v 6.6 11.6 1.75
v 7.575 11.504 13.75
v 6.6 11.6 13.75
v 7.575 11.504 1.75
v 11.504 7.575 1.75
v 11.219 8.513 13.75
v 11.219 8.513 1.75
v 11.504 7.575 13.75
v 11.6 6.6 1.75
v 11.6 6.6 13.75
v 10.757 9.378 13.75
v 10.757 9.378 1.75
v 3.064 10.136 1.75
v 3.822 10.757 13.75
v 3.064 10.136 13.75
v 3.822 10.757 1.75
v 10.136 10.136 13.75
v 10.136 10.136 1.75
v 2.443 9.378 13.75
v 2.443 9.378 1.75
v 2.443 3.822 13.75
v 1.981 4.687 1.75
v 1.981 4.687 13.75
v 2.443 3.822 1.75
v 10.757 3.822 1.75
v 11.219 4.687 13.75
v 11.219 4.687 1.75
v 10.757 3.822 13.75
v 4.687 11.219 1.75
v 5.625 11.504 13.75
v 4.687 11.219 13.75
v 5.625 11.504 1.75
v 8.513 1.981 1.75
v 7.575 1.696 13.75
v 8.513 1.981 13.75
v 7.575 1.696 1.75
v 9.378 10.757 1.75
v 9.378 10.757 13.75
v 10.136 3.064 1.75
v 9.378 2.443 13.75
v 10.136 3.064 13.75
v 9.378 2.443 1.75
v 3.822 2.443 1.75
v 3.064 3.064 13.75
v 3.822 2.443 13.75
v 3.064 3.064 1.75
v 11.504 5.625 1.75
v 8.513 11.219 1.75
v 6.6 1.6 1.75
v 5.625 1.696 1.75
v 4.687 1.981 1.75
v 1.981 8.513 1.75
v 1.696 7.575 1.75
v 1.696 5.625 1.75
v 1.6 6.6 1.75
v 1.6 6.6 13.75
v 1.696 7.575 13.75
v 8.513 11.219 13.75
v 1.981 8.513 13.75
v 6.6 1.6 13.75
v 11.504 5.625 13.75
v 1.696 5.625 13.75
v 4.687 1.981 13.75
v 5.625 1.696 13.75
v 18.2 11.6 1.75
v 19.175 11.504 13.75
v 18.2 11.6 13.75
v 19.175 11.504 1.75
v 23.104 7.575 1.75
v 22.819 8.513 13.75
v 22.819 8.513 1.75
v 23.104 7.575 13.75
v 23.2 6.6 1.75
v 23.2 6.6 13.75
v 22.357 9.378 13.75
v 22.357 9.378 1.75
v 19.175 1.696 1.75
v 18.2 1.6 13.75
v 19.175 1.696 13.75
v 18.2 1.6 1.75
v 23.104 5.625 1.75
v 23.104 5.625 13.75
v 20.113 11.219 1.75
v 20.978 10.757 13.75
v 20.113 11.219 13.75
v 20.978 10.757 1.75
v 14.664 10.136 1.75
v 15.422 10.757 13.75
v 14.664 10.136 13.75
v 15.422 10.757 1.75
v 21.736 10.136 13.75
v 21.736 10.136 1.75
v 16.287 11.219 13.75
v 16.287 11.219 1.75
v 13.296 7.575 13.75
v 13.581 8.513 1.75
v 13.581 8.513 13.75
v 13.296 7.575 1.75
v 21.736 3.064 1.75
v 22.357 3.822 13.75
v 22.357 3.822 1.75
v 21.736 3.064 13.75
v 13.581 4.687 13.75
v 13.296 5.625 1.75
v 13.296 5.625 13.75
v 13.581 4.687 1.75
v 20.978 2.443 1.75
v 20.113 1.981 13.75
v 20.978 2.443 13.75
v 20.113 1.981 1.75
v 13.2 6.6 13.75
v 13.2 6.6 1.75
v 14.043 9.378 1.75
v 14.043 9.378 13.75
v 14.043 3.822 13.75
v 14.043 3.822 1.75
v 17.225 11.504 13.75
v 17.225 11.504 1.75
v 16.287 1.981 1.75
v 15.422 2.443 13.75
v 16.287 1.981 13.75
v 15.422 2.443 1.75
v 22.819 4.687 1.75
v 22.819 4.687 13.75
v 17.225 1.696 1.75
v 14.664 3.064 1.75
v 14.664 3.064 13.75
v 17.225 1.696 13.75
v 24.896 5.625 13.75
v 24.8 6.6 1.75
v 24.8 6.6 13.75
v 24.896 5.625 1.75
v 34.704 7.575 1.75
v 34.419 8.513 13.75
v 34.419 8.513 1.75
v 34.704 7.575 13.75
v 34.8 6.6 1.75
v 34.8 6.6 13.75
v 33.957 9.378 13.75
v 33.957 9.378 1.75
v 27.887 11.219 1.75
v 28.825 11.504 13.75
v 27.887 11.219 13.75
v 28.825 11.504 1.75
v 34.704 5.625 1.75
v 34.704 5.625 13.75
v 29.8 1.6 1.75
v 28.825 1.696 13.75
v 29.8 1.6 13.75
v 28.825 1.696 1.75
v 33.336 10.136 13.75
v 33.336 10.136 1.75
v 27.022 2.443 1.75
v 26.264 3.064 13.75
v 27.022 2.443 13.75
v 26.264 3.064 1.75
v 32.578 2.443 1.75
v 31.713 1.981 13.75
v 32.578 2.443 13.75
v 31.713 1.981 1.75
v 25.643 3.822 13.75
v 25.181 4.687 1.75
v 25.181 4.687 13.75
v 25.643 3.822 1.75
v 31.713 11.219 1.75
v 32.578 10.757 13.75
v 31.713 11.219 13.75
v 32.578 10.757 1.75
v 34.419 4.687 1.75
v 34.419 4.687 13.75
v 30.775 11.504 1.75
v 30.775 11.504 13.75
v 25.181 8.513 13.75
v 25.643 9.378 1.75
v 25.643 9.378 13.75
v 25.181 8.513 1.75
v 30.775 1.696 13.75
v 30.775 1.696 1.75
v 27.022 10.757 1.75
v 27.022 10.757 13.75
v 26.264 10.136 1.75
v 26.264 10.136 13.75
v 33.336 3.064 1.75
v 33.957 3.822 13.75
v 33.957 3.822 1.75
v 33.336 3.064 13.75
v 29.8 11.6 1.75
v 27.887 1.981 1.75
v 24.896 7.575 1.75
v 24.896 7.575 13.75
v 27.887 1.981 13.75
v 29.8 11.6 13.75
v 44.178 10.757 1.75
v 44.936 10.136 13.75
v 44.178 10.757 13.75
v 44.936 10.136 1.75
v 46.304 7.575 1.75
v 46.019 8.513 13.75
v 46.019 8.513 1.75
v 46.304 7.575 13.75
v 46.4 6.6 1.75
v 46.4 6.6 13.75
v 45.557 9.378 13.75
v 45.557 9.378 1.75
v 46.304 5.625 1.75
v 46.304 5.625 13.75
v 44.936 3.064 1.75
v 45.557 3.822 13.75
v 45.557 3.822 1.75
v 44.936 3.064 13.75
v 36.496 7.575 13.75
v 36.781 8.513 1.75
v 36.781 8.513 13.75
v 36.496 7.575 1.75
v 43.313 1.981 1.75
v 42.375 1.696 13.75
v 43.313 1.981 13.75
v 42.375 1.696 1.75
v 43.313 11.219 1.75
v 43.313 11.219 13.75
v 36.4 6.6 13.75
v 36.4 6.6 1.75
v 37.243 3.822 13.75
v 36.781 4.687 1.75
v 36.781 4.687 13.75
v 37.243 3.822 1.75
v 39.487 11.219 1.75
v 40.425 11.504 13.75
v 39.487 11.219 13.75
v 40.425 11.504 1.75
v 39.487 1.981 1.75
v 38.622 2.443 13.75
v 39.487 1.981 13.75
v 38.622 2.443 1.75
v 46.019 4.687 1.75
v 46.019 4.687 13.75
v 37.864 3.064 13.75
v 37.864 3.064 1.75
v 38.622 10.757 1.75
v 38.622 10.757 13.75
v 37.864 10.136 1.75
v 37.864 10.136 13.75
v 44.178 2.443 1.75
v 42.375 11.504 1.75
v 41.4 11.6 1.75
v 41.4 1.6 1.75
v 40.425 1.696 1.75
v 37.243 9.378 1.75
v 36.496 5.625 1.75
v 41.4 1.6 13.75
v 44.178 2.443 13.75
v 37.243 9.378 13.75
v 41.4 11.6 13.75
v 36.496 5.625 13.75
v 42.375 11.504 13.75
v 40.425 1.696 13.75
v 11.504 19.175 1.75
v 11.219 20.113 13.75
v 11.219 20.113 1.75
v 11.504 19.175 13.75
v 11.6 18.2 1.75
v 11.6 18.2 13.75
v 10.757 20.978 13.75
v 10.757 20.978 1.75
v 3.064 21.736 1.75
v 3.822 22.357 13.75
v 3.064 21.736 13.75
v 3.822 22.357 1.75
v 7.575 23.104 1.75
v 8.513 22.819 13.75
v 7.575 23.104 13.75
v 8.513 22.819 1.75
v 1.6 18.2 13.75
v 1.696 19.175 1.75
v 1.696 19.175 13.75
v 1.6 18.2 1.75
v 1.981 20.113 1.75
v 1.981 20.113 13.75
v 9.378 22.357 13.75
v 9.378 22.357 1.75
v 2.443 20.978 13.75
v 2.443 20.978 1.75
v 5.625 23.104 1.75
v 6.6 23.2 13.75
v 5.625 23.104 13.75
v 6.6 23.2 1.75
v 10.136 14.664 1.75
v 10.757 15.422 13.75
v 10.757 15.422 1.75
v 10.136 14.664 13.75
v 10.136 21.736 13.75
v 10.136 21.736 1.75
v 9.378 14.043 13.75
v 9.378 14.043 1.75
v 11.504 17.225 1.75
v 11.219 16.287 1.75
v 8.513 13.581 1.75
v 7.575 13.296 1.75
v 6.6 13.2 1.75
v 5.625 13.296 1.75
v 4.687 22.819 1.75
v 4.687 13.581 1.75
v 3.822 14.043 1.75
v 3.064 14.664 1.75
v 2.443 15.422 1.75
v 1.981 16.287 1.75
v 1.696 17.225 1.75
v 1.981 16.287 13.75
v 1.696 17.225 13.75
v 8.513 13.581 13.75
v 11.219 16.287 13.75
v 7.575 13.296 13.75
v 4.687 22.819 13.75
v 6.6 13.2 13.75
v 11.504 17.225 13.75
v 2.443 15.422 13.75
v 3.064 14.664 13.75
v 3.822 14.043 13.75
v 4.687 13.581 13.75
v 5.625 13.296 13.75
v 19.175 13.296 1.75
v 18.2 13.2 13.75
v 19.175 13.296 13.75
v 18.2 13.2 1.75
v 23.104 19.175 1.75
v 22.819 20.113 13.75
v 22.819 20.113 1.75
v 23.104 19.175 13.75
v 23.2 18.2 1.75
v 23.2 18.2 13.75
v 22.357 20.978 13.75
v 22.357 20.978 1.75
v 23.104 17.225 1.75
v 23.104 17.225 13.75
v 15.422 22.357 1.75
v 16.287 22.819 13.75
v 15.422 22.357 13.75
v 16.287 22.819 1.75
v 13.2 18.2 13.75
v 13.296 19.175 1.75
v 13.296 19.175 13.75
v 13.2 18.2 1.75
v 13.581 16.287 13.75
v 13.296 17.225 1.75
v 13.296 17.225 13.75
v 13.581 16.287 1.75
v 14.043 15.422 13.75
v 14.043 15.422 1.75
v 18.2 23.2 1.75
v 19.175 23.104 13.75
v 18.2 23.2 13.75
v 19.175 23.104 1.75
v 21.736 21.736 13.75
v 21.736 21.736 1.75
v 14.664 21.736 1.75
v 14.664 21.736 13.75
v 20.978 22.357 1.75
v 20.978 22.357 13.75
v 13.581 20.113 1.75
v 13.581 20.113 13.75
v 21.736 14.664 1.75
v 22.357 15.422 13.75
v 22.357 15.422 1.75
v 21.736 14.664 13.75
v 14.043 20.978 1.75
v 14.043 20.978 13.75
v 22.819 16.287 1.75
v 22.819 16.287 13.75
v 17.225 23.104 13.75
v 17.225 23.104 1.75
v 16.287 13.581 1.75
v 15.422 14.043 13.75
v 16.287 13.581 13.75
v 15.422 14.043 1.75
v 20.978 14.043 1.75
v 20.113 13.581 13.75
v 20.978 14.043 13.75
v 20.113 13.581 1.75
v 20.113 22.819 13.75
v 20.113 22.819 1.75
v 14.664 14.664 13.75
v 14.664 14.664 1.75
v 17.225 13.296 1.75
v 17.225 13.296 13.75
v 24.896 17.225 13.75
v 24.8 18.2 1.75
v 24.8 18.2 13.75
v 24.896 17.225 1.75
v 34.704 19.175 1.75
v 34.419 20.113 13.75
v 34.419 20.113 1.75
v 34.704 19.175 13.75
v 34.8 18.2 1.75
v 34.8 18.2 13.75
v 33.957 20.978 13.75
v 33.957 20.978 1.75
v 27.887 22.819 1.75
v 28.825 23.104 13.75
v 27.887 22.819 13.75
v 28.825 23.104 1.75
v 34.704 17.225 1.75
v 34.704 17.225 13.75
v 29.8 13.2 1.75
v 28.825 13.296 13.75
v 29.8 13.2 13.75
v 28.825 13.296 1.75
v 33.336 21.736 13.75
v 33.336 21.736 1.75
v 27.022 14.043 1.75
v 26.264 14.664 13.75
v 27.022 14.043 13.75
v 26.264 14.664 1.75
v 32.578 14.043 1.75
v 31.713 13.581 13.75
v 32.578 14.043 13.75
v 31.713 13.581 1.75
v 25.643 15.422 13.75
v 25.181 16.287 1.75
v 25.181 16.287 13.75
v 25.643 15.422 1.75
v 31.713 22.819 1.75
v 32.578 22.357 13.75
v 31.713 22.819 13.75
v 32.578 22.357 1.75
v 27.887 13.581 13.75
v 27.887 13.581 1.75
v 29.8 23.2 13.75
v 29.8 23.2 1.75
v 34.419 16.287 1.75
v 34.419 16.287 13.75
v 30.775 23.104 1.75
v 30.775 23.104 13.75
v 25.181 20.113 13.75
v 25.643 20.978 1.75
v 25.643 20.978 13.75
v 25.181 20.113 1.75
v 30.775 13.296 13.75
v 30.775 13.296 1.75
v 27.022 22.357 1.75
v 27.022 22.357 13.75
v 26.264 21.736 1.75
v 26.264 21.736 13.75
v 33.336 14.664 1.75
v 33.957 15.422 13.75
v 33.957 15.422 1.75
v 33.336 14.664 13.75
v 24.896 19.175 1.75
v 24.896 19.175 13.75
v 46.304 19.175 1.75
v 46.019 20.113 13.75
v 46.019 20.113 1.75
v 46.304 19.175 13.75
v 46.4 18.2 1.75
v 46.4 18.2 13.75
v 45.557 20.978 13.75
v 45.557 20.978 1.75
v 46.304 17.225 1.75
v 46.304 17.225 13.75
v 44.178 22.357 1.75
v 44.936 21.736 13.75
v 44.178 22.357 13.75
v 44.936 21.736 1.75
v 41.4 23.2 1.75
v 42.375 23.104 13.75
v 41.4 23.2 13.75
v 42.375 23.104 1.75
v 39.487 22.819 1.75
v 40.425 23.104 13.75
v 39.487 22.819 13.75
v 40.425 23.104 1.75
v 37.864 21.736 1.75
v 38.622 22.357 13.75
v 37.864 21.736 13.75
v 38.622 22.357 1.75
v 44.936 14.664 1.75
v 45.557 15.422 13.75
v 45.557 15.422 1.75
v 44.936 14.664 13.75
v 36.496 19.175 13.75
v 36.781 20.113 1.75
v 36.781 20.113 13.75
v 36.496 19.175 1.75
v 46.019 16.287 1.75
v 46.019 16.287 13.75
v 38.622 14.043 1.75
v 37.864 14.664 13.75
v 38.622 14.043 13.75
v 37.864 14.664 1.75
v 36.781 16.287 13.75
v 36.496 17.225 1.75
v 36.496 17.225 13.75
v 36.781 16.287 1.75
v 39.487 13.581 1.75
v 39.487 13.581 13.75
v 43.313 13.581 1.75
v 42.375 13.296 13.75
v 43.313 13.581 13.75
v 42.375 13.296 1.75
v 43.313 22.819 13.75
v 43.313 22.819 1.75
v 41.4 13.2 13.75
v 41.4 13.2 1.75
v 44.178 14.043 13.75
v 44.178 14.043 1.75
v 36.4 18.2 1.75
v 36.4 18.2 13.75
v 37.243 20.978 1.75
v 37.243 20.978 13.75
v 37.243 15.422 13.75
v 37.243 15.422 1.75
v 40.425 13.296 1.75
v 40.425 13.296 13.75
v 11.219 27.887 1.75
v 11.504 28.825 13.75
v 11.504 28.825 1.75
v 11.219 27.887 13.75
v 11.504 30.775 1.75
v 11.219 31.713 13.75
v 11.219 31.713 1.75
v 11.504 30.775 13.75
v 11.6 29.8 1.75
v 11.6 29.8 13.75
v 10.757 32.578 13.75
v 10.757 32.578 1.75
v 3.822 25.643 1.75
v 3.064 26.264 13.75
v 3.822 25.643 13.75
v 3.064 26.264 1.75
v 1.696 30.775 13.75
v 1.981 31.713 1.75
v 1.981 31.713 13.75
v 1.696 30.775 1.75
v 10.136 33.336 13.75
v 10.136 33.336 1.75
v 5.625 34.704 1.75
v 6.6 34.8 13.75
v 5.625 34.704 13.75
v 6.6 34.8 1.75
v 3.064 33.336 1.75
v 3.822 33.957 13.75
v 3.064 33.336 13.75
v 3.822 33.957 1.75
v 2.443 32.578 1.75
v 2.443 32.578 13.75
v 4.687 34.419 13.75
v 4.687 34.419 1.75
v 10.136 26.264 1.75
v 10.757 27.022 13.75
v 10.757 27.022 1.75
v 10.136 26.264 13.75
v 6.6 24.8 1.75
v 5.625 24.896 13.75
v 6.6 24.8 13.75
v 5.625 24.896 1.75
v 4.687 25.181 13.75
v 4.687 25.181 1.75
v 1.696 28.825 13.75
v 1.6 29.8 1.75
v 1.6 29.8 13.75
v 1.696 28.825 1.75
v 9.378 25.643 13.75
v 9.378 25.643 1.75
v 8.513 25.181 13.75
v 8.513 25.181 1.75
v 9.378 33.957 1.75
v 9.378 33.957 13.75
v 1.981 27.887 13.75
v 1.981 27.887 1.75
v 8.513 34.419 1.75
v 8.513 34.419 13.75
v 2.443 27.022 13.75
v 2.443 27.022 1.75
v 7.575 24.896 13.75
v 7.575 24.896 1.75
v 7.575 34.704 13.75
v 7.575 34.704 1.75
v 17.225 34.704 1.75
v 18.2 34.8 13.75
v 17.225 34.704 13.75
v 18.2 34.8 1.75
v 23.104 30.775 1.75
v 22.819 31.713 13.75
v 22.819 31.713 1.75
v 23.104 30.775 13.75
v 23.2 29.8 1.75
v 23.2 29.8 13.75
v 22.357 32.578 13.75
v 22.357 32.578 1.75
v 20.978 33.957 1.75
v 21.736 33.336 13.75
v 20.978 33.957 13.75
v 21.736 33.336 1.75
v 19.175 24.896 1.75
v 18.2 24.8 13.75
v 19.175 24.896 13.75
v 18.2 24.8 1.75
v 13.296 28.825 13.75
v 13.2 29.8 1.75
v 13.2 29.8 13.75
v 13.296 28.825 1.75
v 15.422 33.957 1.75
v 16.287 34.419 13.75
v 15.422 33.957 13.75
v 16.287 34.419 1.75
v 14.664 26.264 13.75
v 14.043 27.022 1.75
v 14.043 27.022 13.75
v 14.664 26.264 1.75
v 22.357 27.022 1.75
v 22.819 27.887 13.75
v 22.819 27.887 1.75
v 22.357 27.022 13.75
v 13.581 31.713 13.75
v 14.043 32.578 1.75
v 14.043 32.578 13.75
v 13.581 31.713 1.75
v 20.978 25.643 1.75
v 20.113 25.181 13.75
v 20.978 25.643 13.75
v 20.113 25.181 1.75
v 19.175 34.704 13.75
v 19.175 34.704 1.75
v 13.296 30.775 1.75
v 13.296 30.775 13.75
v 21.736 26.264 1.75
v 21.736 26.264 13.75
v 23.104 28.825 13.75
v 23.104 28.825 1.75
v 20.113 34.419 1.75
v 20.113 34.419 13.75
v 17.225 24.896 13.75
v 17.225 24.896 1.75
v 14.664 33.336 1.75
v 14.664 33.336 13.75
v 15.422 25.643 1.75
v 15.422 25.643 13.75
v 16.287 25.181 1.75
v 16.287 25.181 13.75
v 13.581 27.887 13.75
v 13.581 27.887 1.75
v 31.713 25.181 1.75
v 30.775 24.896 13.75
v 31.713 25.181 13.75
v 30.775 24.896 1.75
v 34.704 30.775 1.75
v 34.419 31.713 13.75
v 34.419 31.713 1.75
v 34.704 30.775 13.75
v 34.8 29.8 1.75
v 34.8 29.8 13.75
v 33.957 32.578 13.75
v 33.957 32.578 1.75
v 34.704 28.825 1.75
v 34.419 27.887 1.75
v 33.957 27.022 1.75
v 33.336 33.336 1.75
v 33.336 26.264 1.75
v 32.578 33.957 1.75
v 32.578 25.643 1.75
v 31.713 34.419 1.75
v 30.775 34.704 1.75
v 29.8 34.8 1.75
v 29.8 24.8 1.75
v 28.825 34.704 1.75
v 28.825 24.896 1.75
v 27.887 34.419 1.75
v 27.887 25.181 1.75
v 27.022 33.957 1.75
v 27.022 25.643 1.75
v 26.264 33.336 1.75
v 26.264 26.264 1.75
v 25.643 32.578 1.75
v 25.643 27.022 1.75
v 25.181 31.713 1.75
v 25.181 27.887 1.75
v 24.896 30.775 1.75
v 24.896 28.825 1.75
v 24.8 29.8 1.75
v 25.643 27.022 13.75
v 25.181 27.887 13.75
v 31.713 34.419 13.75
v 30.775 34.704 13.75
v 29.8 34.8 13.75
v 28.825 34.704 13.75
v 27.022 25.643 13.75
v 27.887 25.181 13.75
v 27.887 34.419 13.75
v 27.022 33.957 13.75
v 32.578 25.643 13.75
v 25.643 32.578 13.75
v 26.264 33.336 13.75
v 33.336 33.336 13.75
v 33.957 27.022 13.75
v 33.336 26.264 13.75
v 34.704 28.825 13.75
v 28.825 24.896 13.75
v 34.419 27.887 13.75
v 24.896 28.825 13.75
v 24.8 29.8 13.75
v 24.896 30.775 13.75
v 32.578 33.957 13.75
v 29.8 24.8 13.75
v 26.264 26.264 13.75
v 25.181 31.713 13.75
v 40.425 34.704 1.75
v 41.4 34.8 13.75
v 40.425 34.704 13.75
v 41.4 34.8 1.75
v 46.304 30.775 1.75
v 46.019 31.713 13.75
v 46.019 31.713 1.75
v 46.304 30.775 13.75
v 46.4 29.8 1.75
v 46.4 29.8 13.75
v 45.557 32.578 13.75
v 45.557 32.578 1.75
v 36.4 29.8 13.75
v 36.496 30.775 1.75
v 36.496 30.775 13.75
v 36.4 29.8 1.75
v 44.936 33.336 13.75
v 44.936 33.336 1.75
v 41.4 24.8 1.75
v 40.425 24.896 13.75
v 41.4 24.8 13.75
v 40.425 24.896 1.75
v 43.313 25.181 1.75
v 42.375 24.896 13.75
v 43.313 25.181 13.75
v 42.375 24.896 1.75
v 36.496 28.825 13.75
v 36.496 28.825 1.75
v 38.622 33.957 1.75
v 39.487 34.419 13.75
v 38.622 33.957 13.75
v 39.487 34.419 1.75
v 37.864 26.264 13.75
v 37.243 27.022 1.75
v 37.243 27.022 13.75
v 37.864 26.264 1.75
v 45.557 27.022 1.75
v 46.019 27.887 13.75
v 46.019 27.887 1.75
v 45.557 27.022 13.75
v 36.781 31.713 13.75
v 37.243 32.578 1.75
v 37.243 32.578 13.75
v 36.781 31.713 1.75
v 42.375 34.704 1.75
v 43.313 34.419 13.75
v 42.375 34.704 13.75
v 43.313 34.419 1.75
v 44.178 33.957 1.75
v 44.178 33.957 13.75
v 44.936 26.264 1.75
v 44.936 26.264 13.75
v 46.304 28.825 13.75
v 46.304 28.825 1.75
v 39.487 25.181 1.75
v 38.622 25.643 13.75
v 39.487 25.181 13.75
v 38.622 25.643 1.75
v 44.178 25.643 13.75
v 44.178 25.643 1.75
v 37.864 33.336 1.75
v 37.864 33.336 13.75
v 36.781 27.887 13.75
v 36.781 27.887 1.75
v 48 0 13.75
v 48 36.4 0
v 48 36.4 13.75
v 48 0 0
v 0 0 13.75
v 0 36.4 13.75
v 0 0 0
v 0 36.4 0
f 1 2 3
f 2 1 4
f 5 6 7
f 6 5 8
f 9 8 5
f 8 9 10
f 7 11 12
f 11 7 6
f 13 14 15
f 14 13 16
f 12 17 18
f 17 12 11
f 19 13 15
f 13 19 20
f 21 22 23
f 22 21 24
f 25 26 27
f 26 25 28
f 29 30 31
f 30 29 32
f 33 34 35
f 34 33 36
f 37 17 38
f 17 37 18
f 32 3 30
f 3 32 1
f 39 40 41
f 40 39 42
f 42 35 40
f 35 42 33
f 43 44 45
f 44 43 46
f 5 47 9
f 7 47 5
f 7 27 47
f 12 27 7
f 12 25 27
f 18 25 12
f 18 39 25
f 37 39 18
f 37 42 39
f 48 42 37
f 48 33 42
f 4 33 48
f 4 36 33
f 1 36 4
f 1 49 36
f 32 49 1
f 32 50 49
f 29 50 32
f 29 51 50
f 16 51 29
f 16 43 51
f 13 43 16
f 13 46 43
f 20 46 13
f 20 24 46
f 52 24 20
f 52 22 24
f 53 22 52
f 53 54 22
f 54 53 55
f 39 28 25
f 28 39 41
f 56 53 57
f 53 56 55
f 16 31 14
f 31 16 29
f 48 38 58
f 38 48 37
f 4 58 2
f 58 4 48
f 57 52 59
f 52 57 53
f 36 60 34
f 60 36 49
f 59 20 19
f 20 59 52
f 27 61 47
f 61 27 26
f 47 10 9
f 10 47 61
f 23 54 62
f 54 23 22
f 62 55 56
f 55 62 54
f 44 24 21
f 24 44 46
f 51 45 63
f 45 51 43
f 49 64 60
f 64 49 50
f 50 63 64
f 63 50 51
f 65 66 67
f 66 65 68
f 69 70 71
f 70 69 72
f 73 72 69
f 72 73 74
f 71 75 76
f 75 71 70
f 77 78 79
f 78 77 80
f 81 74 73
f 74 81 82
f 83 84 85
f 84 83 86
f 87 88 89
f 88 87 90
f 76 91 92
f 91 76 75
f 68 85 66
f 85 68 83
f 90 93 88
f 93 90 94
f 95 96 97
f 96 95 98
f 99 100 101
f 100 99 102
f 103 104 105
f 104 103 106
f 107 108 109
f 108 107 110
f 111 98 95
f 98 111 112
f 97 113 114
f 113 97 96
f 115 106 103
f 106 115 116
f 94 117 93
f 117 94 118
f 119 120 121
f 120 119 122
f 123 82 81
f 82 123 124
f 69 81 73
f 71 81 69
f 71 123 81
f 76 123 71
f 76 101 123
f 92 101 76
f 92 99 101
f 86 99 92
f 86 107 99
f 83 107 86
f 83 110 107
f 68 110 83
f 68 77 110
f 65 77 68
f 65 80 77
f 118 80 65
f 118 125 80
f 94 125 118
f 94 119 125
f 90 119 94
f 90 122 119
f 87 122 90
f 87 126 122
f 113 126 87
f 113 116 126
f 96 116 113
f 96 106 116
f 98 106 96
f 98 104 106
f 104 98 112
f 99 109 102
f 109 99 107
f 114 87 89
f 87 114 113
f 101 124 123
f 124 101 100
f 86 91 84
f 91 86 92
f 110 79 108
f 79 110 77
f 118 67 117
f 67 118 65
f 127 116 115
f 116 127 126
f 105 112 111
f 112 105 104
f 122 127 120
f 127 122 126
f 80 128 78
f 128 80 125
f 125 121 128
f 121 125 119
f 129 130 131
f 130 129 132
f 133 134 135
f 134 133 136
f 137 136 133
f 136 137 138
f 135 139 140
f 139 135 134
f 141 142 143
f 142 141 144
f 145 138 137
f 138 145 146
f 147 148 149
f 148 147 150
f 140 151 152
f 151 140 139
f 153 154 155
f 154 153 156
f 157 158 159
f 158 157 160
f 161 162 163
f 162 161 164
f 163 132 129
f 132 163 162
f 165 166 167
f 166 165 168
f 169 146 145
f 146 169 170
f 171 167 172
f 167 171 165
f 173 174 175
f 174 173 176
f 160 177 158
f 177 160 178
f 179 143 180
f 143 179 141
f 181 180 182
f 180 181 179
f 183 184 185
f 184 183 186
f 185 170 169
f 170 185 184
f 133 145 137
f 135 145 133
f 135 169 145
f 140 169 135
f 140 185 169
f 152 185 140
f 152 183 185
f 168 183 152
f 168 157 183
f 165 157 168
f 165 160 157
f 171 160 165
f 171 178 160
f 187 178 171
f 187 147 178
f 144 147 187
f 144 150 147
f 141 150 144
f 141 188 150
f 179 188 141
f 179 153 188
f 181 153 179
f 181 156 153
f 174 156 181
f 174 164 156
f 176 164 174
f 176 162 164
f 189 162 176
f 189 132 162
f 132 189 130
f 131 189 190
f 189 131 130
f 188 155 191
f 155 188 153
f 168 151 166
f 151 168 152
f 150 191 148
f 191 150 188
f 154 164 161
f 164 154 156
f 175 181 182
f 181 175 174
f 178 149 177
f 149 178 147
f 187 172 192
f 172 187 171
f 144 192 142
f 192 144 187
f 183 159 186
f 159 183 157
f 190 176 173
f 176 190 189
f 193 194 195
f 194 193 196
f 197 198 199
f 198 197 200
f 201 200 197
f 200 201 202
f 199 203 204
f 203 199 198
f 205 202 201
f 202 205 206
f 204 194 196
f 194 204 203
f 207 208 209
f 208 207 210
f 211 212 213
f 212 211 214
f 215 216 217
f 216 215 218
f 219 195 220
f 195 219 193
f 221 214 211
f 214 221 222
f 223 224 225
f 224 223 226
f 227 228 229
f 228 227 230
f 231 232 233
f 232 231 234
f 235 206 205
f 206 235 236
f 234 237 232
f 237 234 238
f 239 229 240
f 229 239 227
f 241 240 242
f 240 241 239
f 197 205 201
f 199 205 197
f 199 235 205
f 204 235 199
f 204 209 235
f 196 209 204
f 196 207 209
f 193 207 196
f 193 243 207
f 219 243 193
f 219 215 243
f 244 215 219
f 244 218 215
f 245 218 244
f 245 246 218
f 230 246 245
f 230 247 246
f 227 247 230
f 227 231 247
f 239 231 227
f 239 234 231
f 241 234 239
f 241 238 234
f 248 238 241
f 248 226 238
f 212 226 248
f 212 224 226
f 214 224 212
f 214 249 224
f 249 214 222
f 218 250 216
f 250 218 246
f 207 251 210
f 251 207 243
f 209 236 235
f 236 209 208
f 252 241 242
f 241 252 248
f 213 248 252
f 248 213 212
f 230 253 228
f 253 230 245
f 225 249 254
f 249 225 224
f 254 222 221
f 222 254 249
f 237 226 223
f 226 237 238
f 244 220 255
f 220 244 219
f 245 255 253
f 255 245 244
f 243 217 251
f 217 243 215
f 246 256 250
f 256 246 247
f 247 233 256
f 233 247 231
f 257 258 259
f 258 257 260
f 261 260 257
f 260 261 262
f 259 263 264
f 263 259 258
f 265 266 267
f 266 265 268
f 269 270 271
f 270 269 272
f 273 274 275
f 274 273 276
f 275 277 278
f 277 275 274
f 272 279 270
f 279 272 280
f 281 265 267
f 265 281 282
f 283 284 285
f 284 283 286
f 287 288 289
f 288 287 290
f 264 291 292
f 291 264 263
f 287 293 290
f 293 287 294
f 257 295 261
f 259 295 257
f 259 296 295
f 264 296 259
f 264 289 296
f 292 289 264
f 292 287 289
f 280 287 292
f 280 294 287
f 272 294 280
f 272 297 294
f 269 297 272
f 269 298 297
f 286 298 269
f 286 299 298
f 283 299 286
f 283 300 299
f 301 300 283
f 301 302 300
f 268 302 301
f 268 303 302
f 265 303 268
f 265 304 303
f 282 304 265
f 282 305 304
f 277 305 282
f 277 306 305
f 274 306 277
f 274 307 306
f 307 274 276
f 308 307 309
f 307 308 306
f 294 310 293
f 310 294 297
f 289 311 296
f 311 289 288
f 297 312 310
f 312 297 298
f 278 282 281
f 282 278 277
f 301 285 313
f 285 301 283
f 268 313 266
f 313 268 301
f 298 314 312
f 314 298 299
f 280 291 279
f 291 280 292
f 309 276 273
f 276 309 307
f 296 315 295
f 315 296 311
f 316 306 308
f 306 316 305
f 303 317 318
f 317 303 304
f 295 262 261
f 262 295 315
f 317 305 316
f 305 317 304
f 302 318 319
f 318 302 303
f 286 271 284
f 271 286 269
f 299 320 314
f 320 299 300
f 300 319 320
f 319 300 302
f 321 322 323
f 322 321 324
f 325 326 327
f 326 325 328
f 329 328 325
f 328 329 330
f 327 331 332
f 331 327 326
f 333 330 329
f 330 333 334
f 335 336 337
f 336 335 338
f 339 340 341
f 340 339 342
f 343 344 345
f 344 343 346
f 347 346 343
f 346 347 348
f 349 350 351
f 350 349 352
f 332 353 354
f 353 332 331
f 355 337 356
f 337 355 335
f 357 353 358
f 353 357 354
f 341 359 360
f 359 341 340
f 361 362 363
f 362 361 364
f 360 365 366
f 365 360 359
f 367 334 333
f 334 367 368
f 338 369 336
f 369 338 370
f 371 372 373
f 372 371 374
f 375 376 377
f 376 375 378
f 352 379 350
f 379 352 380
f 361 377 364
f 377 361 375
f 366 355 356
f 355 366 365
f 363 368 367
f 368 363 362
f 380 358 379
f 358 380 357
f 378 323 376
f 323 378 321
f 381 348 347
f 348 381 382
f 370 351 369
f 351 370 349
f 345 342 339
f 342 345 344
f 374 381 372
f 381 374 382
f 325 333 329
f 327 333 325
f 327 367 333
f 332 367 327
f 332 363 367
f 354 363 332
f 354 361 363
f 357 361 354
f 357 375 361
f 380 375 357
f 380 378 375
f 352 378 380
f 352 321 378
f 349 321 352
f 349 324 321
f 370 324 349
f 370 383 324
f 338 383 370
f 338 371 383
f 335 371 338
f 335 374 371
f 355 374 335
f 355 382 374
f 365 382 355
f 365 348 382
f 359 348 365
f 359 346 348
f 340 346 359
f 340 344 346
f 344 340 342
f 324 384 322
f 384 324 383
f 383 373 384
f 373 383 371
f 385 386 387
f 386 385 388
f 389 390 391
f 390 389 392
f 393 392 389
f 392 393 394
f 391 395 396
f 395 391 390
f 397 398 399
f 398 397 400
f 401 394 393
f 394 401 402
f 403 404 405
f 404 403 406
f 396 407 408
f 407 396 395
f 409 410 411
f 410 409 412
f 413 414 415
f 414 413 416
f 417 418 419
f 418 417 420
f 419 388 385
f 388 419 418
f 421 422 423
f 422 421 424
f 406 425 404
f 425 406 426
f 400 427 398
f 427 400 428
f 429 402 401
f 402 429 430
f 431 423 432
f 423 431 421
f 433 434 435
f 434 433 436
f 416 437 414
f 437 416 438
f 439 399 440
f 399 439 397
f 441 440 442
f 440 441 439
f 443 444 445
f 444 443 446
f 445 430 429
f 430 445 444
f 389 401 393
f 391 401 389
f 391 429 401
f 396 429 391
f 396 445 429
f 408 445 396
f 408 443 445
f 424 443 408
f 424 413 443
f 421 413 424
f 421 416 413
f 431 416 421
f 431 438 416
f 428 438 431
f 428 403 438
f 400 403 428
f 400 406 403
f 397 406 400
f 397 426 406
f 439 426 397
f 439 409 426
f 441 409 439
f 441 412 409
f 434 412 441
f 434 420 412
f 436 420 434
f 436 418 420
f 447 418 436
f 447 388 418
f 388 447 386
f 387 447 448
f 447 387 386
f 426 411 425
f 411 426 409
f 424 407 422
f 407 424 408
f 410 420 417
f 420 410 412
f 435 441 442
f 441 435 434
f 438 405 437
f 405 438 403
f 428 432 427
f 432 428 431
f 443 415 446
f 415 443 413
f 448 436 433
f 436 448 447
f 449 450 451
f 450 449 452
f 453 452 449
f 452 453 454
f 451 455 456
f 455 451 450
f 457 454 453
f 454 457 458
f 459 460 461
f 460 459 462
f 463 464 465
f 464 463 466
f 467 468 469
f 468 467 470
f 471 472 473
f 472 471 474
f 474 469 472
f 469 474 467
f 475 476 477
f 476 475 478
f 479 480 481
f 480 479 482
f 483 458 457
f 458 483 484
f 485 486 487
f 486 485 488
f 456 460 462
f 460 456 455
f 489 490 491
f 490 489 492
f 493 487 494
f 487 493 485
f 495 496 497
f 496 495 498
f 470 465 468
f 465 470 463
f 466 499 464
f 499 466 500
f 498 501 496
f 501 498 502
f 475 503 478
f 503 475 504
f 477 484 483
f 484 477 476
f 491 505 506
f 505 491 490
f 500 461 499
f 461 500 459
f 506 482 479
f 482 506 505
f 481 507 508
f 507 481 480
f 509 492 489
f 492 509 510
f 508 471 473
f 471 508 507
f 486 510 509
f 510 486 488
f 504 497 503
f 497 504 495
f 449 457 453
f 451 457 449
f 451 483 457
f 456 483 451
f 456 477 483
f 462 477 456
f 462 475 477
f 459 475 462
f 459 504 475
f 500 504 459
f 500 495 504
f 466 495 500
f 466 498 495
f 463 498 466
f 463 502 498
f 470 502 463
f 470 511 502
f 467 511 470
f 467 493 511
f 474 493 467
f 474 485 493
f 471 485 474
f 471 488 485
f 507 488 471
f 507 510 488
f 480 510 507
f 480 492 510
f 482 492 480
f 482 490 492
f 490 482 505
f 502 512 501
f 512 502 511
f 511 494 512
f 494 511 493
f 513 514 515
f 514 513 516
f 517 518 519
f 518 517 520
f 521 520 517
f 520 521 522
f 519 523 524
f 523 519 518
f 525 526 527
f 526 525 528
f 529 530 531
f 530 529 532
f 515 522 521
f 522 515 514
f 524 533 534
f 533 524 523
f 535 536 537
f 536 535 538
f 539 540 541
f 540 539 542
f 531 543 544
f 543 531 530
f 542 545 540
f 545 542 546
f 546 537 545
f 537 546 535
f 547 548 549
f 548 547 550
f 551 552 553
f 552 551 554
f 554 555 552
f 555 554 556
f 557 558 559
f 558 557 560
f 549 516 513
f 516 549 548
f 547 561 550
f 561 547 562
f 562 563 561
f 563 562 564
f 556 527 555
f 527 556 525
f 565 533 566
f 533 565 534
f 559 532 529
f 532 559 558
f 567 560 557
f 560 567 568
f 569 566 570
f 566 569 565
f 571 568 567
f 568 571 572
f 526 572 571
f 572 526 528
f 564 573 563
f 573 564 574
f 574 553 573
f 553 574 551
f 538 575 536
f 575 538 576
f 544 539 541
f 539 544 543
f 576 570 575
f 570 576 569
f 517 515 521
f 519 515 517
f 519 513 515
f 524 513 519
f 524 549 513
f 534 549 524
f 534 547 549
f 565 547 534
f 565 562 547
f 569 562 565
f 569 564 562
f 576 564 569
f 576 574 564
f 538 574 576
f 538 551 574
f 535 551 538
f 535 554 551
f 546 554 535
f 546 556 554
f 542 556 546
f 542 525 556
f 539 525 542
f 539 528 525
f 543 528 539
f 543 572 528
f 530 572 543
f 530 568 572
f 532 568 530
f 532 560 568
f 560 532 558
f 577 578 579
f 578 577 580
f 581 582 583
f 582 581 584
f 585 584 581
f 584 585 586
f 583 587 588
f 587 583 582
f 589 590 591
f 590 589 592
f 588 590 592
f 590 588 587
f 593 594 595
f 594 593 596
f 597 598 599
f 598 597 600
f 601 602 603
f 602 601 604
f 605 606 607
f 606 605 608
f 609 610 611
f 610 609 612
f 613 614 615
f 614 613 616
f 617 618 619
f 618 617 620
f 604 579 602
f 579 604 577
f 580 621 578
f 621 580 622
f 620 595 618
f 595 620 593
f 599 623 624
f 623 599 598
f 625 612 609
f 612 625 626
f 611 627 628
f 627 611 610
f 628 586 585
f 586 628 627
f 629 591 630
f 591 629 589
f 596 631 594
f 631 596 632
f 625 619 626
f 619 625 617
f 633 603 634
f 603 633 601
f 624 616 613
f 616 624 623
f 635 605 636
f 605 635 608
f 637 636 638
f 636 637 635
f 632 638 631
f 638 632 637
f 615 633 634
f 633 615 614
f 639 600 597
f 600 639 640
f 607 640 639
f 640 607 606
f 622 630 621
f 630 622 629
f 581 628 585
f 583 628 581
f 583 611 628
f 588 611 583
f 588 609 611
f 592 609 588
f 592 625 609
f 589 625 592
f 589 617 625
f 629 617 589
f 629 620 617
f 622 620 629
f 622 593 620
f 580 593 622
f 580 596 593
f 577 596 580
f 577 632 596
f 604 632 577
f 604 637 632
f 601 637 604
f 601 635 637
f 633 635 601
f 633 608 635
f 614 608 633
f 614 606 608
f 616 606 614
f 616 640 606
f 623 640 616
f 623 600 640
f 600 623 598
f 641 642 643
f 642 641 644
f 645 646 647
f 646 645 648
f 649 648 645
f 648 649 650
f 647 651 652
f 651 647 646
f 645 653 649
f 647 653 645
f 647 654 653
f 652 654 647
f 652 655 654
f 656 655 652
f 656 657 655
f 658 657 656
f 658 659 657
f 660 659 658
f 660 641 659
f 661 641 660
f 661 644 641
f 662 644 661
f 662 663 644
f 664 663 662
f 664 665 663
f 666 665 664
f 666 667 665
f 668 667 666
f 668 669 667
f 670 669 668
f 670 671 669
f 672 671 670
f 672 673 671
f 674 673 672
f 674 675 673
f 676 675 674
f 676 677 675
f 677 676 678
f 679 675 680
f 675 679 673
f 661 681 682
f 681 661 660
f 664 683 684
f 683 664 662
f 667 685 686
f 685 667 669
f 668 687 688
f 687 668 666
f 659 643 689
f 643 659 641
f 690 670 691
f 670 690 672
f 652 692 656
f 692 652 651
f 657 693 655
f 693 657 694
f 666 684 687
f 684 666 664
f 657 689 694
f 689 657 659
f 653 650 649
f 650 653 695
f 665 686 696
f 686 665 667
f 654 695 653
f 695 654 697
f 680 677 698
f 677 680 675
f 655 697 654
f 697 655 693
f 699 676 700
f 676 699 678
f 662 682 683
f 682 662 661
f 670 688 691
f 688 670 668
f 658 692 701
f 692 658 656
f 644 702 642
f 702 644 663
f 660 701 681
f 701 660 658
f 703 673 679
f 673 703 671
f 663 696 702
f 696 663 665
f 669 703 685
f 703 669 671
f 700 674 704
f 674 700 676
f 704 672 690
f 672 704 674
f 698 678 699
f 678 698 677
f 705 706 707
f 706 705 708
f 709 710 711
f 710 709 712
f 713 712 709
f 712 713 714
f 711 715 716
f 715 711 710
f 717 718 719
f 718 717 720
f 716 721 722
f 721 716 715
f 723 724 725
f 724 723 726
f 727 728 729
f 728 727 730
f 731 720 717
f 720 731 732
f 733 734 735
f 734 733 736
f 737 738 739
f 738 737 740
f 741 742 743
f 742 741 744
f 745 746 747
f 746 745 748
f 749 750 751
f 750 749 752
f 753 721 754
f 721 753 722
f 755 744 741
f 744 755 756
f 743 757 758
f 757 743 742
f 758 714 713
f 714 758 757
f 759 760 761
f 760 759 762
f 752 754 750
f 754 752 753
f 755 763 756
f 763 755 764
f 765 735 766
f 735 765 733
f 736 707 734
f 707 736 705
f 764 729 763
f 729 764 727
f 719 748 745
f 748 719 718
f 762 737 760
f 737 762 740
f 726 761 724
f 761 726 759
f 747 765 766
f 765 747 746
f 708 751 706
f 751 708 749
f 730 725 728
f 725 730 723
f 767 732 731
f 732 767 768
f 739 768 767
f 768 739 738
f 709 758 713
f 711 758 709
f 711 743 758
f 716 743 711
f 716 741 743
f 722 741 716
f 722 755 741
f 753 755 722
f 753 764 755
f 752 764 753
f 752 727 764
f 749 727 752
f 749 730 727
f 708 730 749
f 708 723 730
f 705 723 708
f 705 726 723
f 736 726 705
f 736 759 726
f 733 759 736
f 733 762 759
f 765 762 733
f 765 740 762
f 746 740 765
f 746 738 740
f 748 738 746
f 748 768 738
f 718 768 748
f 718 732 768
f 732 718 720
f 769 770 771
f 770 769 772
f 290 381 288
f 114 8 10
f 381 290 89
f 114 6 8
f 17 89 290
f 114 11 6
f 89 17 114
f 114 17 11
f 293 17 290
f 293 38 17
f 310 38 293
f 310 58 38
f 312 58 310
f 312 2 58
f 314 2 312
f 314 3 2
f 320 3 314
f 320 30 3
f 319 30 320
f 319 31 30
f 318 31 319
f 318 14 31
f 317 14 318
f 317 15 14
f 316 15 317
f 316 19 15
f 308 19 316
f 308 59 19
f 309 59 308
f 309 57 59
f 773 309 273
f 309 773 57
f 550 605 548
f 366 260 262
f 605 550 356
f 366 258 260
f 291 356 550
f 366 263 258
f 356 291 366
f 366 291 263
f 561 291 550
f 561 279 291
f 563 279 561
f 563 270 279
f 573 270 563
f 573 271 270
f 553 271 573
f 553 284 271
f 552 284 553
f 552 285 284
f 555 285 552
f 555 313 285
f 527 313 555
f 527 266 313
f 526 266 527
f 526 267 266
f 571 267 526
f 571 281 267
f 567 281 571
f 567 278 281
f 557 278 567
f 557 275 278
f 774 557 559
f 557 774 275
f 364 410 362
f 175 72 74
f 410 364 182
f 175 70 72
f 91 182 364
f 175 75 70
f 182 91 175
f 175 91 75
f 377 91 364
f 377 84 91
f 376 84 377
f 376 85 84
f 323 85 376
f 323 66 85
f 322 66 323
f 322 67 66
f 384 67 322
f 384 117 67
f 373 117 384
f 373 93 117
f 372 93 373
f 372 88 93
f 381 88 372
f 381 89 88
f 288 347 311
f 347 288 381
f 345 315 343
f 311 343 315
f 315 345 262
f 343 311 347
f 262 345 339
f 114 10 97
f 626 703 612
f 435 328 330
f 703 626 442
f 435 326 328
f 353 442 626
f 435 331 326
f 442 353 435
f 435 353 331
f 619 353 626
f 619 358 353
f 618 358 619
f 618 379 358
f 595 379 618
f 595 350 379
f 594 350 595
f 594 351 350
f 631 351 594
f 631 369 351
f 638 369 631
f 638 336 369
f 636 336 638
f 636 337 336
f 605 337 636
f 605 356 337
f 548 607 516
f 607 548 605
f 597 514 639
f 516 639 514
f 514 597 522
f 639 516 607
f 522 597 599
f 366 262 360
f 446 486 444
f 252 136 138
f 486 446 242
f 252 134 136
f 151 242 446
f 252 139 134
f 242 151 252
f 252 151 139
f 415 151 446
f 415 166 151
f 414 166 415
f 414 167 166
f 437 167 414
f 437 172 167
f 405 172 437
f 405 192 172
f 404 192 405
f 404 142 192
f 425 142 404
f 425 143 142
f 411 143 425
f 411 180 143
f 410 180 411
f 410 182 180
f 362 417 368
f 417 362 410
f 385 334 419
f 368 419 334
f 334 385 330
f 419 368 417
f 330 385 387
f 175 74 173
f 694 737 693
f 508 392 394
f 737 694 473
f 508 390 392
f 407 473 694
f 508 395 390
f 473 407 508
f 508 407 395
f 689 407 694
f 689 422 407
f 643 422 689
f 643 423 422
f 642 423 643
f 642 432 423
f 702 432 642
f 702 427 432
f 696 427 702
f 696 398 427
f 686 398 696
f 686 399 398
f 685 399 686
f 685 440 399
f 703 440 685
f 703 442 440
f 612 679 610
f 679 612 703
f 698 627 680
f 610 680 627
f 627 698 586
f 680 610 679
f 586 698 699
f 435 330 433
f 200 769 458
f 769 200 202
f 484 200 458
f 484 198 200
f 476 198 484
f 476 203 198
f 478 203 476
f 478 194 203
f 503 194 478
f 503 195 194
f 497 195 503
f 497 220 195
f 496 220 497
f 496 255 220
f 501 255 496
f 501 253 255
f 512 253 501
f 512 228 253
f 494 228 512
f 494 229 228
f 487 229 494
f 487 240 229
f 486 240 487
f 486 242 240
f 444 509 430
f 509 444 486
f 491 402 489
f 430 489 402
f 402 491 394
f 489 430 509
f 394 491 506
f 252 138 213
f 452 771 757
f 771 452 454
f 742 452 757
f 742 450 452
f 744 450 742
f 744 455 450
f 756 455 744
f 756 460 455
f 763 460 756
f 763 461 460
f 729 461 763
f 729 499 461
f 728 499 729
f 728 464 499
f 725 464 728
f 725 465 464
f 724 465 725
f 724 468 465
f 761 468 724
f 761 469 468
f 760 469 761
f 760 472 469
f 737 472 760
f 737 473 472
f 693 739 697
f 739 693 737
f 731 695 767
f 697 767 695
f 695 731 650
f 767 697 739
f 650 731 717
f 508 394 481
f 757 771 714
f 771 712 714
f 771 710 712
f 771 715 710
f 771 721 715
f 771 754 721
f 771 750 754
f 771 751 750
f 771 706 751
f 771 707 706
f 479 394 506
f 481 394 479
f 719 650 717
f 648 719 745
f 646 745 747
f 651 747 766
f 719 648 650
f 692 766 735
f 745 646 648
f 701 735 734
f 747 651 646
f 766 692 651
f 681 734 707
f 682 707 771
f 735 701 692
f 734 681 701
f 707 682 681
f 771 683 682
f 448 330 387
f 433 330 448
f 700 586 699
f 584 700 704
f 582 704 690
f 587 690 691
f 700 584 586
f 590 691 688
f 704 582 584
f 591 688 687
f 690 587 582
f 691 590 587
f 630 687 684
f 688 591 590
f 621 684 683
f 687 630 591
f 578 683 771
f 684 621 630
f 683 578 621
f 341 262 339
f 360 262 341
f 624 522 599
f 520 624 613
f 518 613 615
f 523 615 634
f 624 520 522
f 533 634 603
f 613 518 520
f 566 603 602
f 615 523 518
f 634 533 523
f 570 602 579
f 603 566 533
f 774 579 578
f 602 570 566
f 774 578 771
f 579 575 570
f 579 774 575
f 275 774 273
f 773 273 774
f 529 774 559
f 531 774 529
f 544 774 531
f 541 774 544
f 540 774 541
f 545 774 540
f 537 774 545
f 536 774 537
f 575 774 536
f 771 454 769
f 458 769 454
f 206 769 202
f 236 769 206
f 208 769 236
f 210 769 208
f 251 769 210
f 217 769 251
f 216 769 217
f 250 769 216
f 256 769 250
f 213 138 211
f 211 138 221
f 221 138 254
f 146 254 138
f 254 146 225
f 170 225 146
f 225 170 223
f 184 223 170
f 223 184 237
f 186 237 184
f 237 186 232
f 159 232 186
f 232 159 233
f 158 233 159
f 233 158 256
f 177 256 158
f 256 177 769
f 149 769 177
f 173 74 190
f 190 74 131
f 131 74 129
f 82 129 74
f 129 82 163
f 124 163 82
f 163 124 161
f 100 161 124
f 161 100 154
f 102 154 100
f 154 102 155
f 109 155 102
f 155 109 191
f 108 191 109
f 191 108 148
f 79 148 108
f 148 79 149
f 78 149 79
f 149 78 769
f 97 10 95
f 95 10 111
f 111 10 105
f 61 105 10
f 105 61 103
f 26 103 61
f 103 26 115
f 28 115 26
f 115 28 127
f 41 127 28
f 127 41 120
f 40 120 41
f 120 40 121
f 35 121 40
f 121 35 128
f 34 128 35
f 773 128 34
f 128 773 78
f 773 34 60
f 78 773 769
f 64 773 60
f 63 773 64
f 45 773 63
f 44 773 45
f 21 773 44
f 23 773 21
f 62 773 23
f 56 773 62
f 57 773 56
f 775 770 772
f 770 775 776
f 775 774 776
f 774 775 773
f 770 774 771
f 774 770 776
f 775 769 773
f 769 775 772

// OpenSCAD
// [FL_INDEX: keywords="openscad, 3d_parametric, Customizable_Cuvette_Vial_Rack, csg_solid" | COT="Parametric OpenSCAD design from 3DCodeverse"]
// Title: Customizable Cuvette/Vial Rack

//design and code by emanresu (http://www.thingiverse.com/Emanresu)
//This code generates a rack with round or square holes.

//CUSTOMIZER VARIABLES



//round or square holes?
hole_shape=1; //[1:Round,0:Square]
//length of edge/diameter if square/round holes (mm)
hole_size=10;
//depth of hole (mm)
hole_depth=12;
//number of rows along the x axis
rows=4;
//number of columns along the y axis
columns=3;
//space between holes (mm)
spacing=1.6;
//thickness of bottom layer (mm)
bottom_thick=1.75;


/* [Hidden] */

//set openSCAD resolution
$fa=1;
$fs=1;


//takes an appropriately sized block and removes an array of holes
difference() {
	//main body
	cube(size=[rows*(hole_size+spacing)+spacing, columns*(hole_size+spacing)+spacing, bottom_thick+hole_depth], center=false);
	//holes
	holes(hole_shape,hole_size,hole_depth,rows,columns,spacing,bottom_thick);
}



module holes(hole_shape,hole_size,hole_depth,rows,columns,spacing,bottom_thick) {
	//This module generates an array of holes with one corner at the origin
	//moves the array of holes to be alligned with a non-centered cube later
	//moves corner of array to origin, raises holes by bottom_thick
	translate([hole_size/2+spacing, hole_size/2+spacing, hole_depth/2+bottom_thick+0.5]) {
		//generating rows and columns of holes
		//columns are Y axis
		for (b=[0:columns-1]) {
			//rows are X axis
			for (i=[0:rows-1]) {
				translate([i*(hole_size+spacing), b*(hole_size+spacing), 0]) {
					//square or round holes?
					//value of 1 = circles
					if (hole_shape==1) {
						cylinder(r=hole_size/2, h=hole_depth+1, center=true);
					}
					//any value not equal to 1 generates square holes
					else {cube(size=[hole_size, hole_size, hole_depth+1], center=true);
					}
						
					
				}
			}
		}	
	}
}
